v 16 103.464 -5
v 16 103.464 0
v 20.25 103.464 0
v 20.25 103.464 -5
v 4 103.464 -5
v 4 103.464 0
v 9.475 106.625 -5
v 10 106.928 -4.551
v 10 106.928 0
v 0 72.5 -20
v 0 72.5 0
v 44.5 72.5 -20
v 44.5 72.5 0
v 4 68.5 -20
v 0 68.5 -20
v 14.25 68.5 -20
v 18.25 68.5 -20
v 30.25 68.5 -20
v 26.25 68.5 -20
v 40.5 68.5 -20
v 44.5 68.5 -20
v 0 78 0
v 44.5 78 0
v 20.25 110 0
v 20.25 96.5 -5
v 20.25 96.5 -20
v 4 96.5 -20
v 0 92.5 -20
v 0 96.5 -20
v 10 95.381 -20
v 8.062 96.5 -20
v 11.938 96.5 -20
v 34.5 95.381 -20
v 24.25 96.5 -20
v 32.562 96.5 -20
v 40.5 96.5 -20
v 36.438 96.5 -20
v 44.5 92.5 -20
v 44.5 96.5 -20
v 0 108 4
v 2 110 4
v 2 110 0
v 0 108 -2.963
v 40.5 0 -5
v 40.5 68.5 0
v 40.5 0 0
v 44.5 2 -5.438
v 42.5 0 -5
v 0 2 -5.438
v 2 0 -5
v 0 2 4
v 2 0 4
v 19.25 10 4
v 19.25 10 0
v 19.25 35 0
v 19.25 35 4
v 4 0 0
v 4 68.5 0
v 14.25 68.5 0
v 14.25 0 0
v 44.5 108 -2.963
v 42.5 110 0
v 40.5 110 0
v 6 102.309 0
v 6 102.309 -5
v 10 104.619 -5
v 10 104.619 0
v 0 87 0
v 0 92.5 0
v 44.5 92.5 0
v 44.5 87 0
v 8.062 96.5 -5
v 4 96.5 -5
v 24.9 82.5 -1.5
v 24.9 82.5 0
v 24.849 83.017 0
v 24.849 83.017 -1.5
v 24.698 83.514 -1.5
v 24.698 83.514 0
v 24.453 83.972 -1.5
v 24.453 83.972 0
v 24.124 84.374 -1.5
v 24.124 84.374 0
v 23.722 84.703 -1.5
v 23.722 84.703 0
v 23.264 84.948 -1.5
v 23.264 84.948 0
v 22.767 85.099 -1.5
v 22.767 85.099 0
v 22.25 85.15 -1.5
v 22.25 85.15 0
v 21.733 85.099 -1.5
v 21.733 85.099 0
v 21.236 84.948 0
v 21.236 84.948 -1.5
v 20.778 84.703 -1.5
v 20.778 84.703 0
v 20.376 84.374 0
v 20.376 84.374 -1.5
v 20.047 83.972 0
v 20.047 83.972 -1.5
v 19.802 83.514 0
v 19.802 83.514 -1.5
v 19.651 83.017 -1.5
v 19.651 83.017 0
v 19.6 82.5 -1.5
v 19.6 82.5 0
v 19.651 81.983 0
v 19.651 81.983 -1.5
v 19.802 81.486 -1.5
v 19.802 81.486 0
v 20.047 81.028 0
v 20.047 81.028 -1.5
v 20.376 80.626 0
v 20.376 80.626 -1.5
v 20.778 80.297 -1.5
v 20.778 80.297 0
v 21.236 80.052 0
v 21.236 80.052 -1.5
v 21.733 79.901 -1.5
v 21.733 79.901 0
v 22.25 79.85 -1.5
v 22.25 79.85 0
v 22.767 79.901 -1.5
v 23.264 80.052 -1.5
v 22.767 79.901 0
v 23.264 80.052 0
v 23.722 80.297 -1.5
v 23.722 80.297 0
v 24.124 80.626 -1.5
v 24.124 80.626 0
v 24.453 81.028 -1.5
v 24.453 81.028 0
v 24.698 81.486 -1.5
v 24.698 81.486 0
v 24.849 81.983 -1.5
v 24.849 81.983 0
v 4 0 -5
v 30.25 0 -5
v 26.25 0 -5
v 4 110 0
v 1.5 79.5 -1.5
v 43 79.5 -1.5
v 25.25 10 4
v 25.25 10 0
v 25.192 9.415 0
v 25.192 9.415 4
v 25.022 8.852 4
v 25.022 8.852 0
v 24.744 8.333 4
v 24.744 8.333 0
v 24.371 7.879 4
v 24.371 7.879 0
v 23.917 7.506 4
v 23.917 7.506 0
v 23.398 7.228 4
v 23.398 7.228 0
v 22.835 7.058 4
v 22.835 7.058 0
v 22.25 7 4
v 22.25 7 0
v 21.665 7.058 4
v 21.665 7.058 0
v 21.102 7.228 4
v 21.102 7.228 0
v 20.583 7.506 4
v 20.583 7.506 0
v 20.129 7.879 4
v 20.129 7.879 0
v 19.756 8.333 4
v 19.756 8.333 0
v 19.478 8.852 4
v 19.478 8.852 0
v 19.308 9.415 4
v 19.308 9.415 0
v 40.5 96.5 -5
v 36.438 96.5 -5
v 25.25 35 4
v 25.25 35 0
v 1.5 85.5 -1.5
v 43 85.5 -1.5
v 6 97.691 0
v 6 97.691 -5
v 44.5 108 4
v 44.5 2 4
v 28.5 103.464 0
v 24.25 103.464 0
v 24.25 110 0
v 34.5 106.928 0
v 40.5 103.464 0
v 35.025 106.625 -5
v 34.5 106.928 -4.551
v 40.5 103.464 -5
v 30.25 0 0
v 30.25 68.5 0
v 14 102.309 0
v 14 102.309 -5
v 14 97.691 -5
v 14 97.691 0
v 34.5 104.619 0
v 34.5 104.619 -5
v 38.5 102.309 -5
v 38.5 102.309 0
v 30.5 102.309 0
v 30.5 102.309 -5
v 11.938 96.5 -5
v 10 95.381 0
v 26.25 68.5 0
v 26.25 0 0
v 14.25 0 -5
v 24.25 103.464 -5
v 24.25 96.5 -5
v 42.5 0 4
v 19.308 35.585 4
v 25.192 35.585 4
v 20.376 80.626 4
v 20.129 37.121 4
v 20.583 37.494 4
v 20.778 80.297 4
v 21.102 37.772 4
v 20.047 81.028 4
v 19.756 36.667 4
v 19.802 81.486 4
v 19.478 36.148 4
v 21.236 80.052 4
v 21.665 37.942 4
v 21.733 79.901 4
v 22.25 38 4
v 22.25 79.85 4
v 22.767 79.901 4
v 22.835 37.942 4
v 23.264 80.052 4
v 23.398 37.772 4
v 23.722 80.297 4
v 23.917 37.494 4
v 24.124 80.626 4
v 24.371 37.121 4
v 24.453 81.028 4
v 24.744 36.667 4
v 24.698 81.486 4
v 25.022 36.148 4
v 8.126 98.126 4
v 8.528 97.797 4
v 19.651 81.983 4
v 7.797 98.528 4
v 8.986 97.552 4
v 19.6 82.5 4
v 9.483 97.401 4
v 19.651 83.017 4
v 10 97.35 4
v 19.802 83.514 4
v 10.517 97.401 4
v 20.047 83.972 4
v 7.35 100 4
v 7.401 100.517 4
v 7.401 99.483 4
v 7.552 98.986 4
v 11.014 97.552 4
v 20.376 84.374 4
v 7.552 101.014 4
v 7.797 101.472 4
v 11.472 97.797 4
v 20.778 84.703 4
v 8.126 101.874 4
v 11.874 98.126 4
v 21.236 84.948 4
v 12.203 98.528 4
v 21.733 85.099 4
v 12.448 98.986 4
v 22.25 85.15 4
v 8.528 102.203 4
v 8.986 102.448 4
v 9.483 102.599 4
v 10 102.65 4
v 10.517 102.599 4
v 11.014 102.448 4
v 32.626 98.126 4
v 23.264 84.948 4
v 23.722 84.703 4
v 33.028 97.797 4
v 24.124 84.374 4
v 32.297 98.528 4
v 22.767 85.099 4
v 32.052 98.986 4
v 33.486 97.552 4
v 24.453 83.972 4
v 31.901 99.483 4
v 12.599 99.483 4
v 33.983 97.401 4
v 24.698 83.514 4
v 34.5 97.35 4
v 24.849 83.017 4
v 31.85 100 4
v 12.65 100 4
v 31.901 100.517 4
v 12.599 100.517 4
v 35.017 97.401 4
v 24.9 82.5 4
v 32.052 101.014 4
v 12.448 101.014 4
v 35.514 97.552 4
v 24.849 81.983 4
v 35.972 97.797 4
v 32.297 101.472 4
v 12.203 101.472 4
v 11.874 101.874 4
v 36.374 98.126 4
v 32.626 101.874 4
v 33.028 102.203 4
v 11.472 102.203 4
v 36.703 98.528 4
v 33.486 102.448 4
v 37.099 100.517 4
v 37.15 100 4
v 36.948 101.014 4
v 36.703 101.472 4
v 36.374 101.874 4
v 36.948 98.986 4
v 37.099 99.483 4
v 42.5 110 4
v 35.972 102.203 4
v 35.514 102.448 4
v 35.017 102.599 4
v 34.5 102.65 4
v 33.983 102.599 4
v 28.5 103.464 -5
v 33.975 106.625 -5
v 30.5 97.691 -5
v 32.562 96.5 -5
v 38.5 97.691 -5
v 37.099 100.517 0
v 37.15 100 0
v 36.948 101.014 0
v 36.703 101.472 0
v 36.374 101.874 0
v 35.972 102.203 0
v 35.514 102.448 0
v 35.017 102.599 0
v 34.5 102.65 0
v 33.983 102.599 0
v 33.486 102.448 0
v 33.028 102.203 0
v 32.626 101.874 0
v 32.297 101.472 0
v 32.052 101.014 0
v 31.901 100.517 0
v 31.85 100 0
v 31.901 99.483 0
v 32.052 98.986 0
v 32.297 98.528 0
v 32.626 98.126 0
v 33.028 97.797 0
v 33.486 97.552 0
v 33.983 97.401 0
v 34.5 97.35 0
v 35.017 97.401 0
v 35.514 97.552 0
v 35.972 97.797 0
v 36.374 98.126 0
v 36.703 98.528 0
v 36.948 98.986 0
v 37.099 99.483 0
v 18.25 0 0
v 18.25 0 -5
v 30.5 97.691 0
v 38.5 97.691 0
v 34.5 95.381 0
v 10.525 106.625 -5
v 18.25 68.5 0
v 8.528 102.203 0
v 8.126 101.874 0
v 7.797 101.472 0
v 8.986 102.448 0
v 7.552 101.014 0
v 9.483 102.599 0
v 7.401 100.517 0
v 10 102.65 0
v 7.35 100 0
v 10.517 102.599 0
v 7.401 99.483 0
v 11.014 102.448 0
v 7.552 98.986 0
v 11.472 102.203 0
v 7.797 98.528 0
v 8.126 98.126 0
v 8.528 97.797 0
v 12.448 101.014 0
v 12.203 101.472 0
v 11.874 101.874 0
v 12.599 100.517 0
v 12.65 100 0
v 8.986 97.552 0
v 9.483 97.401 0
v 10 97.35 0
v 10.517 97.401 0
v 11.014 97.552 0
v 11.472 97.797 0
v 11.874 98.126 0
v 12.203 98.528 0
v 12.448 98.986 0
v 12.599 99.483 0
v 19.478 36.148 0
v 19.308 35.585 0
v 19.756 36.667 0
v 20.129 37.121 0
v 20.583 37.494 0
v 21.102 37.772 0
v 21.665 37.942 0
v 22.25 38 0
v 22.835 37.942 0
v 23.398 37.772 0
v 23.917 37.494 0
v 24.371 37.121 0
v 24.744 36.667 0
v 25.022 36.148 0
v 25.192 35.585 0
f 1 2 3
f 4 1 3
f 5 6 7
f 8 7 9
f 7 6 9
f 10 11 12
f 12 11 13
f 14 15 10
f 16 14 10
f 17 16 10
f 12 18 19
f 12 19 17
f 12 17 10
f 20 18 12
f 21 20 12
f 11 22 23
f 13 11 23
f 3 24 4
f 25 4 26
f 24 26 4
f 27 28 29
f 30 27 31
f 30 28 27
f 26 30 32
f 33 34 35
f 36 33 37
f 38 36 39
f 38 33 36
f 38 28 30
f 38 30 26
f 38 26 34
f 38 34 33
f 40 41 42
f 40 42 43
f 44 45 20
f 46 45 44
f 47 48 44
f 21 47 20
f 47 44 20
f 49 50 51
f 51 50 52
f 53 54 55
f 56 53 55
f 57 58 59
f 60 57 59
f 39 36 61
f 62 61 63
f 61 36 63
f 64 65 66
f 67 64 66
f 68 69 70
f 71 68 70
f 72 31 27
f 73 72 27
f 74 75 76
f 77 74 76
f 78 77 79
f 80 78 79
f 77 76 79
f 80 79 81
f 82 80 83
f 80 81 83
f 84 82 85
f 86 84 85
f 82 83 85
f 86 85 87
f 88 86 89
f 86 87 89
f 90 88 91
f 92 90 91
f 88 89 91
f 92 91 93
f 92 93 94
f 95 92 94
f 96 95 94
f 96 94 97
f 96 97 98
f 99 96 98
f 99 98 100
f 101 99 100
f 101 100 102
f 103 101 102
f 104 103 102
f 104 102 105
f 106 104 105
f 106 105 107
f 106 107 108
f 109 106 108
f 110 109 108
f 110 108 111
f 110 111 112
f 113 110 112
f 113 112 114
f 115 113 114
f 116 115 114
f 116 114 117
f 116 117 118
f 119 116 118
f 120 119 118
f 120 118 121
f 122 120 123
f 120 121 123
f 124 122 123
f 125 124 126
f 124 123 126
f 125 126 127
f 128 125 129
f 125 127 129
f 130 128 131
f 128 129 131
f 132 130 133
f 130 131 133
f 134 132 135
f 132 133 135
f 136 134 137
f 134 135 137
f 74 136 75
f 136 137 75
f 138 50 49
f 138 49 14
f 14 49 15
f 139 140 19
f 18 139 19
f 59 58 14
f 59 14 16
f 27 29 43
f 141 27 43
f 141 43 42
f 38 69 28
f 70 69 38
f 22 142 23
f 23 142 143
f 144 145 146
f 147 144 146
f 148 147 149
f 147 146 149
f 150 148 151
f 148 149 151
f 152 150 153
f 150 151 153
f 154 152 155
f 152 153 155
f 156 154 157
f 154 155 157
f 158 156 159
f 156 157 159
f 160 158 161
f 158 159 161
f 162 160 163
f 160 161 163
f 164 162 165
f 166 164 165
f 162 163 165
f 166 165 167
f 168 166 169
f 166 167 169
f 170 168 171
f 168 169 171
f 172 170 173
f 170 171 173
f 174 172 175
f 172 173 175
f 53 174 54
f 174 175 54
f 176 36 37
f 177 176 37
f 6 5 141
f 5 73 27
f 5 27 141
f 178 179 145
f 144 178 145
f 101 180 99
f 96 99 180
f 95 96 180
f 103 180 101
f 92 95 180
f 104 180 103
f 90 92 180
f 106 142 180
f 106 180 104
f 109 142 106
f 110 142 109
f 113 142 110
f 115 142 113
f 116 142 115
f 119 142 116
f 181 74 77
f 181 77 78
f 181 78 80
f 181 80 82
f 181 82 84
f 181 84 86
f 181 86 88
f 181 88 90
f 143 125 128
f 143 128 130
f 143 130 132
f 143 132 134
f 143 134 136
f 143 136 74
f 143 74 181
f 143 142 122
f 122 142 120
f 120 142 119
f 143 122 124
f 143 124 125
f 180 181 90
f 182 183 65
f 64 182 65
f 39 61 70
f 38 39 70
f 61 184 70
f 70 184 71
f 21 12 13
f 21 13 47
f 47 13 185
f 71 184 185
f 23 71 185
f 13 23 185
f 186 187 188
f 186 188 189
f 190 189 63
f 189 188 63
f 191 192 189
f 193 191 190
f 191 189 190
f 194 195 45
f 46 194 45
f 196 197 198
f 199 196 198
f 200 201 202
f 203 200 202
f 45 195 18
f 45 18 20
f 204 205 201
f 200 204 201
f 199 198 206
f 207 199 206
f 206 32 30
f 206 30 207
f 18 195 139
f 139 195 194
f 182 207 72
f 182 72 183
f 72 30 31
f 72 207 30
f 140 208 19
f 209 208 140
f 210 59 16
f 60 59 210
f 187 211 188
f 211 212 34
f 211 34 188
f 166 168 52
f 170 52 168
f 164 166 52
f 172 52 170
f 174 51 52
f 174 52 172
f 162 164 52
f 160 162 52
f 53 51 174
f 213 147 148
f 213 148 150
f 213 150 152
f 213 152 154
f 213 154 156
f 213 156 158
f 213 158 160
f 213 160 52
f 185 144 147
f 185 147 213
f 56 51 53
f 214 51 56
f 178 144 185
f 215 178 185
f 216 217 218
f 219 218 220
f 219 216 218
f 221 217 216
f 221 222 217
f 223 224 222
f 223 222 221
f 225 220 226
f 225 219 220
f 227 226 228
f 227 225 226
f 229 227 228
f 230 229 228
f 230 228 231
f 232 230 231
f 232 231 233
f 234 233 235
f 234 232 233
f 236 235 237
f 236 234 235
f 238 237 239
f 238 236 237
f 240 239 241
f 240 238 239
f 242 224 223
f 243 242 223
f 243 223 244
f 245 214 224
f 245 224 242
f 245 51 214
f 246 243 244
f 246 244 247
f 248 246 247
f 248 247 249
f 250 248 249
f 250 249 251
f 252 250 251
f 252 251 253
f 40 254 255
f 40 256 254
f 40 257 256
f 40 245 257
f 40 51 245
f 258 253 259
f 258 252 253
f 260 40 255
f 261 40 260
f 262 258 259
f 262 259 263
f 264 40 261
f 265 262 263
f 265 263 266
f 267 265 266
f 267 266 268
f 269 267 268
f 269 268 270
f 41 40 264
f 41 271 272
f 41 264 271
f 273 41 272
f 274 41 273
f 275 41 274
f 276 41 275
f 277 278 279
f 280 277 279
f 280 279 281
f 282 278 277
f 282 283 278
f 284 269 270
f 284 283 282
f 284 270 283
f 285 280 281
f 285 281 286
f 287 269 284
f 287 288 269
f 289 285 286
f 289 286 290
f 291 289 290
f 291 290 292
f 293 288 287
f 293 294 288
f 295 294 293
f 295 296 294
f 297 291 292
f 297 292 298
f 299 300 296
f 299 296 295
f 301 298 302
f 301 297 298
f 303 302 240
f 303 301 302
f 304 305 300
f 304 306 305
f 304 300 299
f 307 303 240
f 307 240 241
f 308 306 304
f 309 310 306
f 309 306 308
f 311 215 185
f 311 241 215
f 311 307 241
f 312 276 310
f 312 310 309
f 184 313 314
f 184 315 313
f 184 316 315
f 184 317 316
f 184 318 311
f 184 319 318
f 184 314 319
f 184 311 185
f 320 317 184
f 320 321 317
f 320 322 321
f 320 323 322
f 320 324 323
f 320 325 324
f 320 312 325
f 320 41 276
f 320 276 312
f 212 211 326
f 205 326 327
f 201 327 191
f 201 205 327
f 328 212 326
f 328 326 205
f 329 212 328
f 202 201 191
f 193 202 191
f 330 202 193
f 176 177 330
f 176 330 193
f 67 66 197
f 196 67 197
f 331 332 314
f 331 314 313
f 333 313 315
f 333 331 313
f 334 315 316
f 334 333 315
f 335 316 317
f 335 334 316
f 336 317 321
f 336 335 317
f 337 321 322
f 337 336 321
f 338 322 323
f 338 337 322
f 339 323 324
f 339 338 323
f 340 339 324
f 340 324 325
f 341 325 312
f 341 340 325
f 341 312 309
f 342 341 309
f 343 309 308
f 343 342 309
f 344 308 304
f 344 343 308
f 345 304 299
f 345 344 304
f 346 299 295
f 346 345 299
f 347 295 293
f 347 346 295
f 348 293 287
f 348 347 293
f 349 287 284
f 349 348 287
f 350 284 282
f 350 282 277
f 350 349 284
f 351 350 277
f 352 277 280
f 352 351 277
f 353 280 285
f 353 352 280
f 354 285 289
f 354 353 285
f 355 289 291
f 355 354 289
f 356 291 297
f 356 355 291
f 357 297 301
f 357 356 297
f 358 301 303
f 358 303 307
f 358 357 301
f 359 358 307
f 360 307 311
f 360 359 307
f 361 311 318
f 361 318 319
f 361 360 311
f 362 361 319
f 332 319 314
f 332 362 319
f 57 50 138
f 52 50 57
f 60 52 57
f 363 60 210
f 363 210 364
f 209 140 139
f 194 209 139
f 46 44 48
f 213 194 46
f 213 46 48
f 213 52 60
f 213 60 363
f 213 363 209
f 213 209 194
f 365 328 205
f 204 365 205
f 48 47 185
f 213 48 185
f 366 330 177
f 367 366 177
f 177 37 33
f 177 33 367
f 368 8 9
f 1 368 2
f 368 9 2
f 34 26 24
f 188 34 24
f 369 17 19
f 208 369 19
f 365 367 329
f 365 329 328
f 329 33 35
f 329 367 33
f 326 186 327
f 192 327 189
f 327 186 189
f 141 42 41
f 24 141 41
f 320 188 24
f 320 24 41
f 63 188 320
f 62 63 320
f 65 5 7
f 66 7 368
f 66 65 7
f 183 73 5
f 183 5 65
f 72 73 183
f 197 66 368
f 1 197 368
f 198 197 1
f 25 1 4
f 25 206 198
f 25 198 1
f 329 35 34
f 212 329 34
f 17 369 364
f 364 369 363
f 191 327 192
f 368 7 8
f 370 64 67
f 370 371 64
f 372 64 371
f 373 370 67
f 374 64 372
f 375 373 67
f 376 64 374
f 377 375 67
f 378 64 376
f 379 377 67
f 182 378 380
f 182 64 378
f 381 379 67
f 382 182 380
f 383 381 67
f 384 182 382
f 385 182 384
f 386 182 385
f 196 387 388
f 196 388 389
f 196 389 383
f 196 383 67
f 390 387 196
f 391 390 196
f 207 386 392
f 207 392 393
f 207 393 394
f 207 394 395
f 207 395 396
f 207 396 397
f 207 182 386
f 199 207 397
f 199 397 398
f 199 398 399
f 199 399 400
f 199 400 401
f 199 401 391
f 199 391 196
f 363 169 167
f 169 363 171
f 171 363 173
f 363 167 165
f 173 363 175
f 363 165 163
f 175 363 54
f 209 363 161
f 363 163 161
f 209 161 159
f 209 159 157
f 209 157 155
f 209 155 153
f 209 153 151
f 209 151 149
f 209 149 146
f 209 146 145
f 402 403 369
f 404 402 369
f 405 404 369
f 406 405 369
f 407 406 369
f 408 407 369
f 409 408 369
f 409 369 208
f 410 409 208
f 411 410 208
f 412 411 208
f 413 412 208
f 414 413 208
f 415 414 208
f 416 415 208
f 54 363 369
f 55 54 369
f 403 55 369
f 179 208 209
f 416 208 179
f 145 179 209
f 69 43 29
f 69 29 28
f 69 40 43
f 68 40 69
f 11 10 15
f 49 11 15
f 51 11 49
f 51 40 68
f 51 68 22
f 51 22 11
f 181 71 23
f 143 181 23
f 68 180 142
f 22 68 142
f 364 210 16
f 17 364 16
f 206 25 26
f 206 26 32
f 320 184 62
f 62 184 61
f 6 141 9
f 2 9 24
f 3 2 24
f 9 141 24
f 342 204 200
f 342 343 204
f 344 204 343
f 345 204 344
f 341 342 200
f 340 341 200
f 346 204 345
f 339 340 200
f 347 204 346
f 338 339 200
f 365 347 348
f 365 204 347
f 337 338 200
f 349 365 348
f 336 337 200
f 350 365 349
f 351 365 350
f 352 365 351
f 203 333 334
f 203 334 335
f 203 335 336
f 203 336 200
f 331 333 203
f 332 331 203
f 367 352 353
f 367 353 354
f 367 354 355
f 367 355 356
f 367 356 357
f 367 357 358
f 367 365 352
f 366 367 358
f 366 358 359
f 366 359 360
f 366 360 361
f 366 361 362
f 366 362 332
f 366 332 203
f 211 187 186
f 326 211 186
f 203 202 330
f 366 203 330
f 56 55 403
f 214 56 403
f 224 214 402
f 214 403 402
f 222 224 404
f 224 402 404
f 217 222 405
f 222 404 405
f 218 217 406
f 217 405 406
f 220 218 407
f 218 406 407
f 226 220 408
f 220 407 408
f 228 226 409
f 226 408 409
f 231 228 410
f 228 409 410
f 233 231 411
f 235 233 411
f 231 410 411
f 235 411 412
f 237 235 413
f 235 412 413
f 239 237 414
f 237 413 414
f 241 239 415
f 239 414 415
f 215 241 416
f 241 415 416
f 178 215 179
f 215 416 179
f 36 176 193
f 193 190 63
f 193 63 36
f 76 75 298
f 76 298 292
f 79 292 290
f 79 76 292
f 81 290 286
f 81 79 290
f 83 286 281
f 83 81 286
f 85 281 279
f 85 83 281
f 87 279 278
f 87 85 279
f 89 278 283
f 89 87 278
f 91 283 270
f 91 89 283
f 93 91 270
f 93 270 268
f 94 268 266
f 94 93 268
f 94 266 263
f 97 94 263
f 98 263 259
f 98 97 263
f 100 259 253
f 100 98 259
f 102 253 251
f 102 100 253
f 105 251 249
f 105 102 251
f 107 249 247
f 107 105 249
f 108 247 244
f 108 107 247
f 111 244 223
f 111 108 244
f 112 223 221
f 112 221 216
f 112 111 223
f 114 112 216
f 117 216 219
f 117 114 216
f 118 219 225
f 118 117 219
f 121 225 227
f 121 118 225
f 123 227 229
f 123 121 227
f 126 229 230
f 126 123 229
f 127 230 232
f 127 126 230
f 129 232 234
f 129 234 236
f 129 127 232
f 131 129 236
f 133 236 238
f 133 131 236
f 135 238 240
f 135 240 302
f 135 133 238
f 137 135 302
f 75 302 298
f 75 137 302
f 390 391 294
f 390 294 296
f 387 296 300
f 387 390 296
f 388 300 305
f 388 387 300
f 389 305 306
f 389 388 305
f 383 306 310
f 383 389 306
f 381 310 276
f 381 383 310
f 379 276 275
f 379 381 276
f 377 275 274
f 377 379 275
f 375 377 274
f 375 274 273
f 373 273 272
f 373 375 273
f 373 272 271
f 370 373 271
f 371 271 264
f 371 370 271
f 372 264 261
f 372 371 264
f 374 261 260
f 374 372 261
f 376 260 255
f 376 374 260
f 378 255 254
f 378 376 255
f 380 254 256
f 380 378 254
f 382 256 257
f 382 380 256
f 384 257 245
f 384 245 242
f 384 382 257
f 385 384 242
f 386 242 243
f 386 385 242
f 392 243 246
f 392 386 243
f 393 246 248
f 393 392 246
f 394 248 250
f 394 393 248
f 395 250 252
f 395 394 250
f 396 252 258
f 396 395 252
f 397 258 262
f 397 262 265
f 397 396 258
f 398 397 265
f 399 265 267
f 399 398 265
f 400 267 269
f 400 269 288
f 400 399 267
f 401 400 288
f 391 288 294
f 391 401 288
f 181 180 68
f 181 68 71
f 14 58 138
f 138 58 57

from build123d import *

# Parameters (mm, degrees)
F0_W      = 44.5
F0_H      = 110
F0_R      = 2.65
F1_DEPTH  = 4
F2_W      = 44.5
F2_H      = 4
F3_DEPTH  = 20
F4_W      = 4
F4_H      = 68.5
F4_H_2    = 13.5
F5_DEPTH  = 20
F7_DEPTH  = 20
F9_DEPTH  = 15
F11_DEPTH = 44.501
F12_DEPTH = 20.001
F14_DEPTH = 20
F15_W     = 44.5
F15_H     = 9
F16_DEPTH = 1.5
F17_SIZE  = 1.49999
F18_DEPTH = 20.001
F19_SIZE  = 2


# Not quite as in the source:
# - a fillet or chamfer is up to 0.001 mm smaller than in the source, because OpenCascade refuses the exact size


with BuildPart() as f1:
    # F0 (on Top) → F1 (new body)
    with BuildSketch(Plane.XY):
        with Locations((22.25, 55)):
            Rectangle(F0_W, F0_H)
        with BuildLine():
            Line((25.25, 35), (25.25, 10))
            ThreePointArc((25.25, 10), (22.25, 7), (19.25, 10))
            Line((19.25, 10), (19.25, 35))
            ThreePointArc((19.25, 35), (22.25, 38), (25.25, 35))
        make_face(mode=Mode.SUBTRACT)
        with Locations((10, 100)):
            Circle(F0_R, mode=Mode.SUBTRACT)
        with Locations((22.25, 82.5)):
            Circle(F0_R, mode=Mode.SUBTRACT)
        with Locations((34.5, 100)):
            Circle(F0_R, mode=Mode.SUBTRACT)
    extrude(amount=F1_DEPTH)

    # F2 (on face) → F3 (join)
    with BuildSketch(Plane(origin=(0, 0, 0), x_dir=(1, 0, 0), z_dir=(0, 0, -1))):
        with Locations((22.25, -94.5)):
            Rectangle(F2_W, F2_H)
        with Locations((22.25, -70.5)):
            Rectangle(F2_W, F2_H)
    extrude(amount=F3_DEPTH)

    # F4 (on face) → F5 (join)
    with BuildSketch(Plane(origin=(0, 0, 0), x_dir=(1, 0, 0), z_dir=(0, 0, -1))):
        with Locations((2, -34.25)):
            Rectangle(F4_W, F4_H)
        with Locations((42.5, -34.25)):
            Rectangle(F4_W, F4_H)
        Polygon((0, -96.5), (0, -110), (4, -110), (4, -103.4641016151), (4, -96.5358983849), (4, -96.5), align=None)
        Polygon((4, -96.5358983849), (4, -103.4641016151), (10, -106.9282032303), (16, -103.4641016151), (16, -96.5358983849), (15.9378221735, -96.5), (11.9378221735, -96.5), (14, -97.6905989232), (14, -102.3094010768), (10, -104.6188021535), (6, -102.3094010768), (6, -97.6905989232), (8.0621778265, -96.5), (4.0621778265, -96.5), align=None)
        Polygon((11.9378221735, -96.5), (8.0621778265, -96.5), (6, -97.6905989232), (6, -102.3094010768), (10, -104.6188021535), (14, -102.3094010768), (14, -97.6905989232), align=None)
        Polygon((40.5, -110), (44.5, -110), (44.5, -96.5), (40.5, -96.5), (40.5, -96.5358983849), (40.5, -103.4641016151), align=None)
        Polygon((34.5, -106.9282032303), (40.5, -103.4641016151), (40.5, -96.5358983849), (40.4378221735, -96.5), (36.4378221735, -96.5), (38.5, -97.6905989232), (38.5, -102.3094010768), (34.5, -104.6188021535), (30.5, -102.3094010768), (30.5, -97.6905989232), (32.5621778265, -96.5), (28.5621778265, -96.5), (28.5, -96.5358983849), (28.5, -103.4641016151), align=None)
        Polygon((38.5, -97.6905989232), (36.4378221735, -96.5), (32.5621778265, -96.5), (30.5, -97.6905989232), (30.5, -102.3094010768), (34.5, -104.6188021535), (38.5, -102.3094010768), align=None)
        Polygon((32.5621778265, -96.5), (36.4378221735, -96.5), (34.5, -95.3811978465), align=None)
        with Locations((16.25, -34.25)):
            Rectangle(F4_W, F4_H)
        with Locations((28.25, -34.25)):
            Rectangle(F4_W, F4_H)
        with Locations((22.25, -103.25)):
            Rectangle(F4_W, F4_H_2)
    extrude(amount=F5_DEPTH)

    # F6 (on face) → F7 (join)
    with BuildSketch(Plane(origin=(0, 0, 0), x_dir=(1, 0, 0), z_dir=(0, 0, -1))):
        Polygon((40.5, -96.5), (40.4378221735, -96.5), (40.5, -96.5358983849), align=None)
        Polygon((4.0621778265, -96.5), (4, -96.5), (4, -96.5358983849), align=None)
        Polygon((16, -96.5358983849), (16, -103.4641016151), (20.25, -103.4641016151), (20.25, -96.5), (15.9378221735, -96.5), align=None)
        Polygon((28.5621778265, -96.5), (24.25, -96.5), (24.25, -103.4641016151), (28.5, -103.4641016151), (28.5, -96.5358983849), align=None)
    extrude(amount=F7_DEPTH)

    # F8 (on face) → F9 (cut)
    with BuildSketch(Plane(origin=(0, 0, -20), x_dir=(1, 0, 0), z_dir=(0, 0, -1))):
        Polygon((4, -103.4641016151), (10, -106.9282032303), (16, -103.4641016151), (20.25, -103.4641016151), (20.25, -96.5), (4, -96.5), align=None)
        Polygon((24.25, -103.4641016151), (28.5, -103.4641016151), (34.5, -106.9282032303), (40.5, -103.4641016151), (40.5, -96.5), (24.25, -96.5), align=None)
    extrude(amount=-F9_DEPTH, mode=Mode.SUBTRACT)

    # F10 (on face) → F11 (cut, through all)
    with BuildSketch(Plane(origin=(0, 0, 0), x_dir=(0, -1, 0), z_dir=(-1, 0, 0))):
        Polygon((-96.5, -20), (-110, 0), (-110, -20), align=None)
        Polygon((0, -5), (-68.5, -20), (0, -20), align=None)
    extrude(amount=-F11_DEPTH, mode=Mode.SUBTRACT)

    # F12 (cut, through all): faces of the model
    f12_faces = [f1.faces().sort_by_distance(p)[0] for p in [
        (34.5, 100, 0),
        (10, 100, 0),
    ]]
    extrude(f12_faces, amount=-F12_DEPTH, mode=Mode.SUBTRACT)

    # F13 (on face) → F14 (cut, through all)
    with BuildSketch(Plane(origin=(0, 0, -20), x_dir=(1, 0, 0), z_dir=(0, 0, -1))):
        Polygon((14, -102.3094010768), (14, -97.6905989232), (10, -95.3811978465), (6, -97.6905989232), (6, -102.3094010768), (10, -104.6188021535), align=None)
        Polygon((38.5, -102.3094010768), (38.5, -97.6905989232), (34.5, -95.3811978465), (30.5, -97.6905989232), (30.5, -102.3094010768), (34.5, -104.6188021535), align=None)
    extrude(amount=-F14_DEPTH, mode=Mode.SUBTRACT)

    # F15 (on face) → F16 (join)
    with BuildSketch(Plane(origin=(0, 0, 0), x_dir=(1, 0, 0), z_dir=(0, 0, -1))):
        with Locations((22.25, -82.5)):
            Rectangle(F15_W, F15_H)
    extrude(amount=F16_DEPTH)

    # F17 (size 1.5 in the source; OpenCascade refuses exactly that, so slightly less here)
    f17_edges = [f1.edges().sort_by_distance(p)[0] for p in [
        (44.5, 82.5, -1.5),
        (22.25, 78, -1.5),
        (0, 82.5, -1.5),
        (22.25, 87, -1.5),
    ]]
    chamfer(f17_edges, length=F17_SIZE)

    # F18 (cut, through all): a face of the model
    f18_faces = [f1.faces().sort_by_distance(p)[0] for p in [
        (22.25, 82.5, 0),
    ]]
    extrude(f18_faces, amount=-F18_DEPTH, mode=Mode.SUBTRACT)

    # F19
    f19_edges = [f1.edges().sort_by_distance(p)[0] for p in [
        (44.5, 110, 2),
        (0, 110, 2),
        (0, 0, -0.5),
        (44.5, 0, -0.5),
    ]]
    chamfer(f19_edges, length=F19_SIZE)


solid = f1.part
